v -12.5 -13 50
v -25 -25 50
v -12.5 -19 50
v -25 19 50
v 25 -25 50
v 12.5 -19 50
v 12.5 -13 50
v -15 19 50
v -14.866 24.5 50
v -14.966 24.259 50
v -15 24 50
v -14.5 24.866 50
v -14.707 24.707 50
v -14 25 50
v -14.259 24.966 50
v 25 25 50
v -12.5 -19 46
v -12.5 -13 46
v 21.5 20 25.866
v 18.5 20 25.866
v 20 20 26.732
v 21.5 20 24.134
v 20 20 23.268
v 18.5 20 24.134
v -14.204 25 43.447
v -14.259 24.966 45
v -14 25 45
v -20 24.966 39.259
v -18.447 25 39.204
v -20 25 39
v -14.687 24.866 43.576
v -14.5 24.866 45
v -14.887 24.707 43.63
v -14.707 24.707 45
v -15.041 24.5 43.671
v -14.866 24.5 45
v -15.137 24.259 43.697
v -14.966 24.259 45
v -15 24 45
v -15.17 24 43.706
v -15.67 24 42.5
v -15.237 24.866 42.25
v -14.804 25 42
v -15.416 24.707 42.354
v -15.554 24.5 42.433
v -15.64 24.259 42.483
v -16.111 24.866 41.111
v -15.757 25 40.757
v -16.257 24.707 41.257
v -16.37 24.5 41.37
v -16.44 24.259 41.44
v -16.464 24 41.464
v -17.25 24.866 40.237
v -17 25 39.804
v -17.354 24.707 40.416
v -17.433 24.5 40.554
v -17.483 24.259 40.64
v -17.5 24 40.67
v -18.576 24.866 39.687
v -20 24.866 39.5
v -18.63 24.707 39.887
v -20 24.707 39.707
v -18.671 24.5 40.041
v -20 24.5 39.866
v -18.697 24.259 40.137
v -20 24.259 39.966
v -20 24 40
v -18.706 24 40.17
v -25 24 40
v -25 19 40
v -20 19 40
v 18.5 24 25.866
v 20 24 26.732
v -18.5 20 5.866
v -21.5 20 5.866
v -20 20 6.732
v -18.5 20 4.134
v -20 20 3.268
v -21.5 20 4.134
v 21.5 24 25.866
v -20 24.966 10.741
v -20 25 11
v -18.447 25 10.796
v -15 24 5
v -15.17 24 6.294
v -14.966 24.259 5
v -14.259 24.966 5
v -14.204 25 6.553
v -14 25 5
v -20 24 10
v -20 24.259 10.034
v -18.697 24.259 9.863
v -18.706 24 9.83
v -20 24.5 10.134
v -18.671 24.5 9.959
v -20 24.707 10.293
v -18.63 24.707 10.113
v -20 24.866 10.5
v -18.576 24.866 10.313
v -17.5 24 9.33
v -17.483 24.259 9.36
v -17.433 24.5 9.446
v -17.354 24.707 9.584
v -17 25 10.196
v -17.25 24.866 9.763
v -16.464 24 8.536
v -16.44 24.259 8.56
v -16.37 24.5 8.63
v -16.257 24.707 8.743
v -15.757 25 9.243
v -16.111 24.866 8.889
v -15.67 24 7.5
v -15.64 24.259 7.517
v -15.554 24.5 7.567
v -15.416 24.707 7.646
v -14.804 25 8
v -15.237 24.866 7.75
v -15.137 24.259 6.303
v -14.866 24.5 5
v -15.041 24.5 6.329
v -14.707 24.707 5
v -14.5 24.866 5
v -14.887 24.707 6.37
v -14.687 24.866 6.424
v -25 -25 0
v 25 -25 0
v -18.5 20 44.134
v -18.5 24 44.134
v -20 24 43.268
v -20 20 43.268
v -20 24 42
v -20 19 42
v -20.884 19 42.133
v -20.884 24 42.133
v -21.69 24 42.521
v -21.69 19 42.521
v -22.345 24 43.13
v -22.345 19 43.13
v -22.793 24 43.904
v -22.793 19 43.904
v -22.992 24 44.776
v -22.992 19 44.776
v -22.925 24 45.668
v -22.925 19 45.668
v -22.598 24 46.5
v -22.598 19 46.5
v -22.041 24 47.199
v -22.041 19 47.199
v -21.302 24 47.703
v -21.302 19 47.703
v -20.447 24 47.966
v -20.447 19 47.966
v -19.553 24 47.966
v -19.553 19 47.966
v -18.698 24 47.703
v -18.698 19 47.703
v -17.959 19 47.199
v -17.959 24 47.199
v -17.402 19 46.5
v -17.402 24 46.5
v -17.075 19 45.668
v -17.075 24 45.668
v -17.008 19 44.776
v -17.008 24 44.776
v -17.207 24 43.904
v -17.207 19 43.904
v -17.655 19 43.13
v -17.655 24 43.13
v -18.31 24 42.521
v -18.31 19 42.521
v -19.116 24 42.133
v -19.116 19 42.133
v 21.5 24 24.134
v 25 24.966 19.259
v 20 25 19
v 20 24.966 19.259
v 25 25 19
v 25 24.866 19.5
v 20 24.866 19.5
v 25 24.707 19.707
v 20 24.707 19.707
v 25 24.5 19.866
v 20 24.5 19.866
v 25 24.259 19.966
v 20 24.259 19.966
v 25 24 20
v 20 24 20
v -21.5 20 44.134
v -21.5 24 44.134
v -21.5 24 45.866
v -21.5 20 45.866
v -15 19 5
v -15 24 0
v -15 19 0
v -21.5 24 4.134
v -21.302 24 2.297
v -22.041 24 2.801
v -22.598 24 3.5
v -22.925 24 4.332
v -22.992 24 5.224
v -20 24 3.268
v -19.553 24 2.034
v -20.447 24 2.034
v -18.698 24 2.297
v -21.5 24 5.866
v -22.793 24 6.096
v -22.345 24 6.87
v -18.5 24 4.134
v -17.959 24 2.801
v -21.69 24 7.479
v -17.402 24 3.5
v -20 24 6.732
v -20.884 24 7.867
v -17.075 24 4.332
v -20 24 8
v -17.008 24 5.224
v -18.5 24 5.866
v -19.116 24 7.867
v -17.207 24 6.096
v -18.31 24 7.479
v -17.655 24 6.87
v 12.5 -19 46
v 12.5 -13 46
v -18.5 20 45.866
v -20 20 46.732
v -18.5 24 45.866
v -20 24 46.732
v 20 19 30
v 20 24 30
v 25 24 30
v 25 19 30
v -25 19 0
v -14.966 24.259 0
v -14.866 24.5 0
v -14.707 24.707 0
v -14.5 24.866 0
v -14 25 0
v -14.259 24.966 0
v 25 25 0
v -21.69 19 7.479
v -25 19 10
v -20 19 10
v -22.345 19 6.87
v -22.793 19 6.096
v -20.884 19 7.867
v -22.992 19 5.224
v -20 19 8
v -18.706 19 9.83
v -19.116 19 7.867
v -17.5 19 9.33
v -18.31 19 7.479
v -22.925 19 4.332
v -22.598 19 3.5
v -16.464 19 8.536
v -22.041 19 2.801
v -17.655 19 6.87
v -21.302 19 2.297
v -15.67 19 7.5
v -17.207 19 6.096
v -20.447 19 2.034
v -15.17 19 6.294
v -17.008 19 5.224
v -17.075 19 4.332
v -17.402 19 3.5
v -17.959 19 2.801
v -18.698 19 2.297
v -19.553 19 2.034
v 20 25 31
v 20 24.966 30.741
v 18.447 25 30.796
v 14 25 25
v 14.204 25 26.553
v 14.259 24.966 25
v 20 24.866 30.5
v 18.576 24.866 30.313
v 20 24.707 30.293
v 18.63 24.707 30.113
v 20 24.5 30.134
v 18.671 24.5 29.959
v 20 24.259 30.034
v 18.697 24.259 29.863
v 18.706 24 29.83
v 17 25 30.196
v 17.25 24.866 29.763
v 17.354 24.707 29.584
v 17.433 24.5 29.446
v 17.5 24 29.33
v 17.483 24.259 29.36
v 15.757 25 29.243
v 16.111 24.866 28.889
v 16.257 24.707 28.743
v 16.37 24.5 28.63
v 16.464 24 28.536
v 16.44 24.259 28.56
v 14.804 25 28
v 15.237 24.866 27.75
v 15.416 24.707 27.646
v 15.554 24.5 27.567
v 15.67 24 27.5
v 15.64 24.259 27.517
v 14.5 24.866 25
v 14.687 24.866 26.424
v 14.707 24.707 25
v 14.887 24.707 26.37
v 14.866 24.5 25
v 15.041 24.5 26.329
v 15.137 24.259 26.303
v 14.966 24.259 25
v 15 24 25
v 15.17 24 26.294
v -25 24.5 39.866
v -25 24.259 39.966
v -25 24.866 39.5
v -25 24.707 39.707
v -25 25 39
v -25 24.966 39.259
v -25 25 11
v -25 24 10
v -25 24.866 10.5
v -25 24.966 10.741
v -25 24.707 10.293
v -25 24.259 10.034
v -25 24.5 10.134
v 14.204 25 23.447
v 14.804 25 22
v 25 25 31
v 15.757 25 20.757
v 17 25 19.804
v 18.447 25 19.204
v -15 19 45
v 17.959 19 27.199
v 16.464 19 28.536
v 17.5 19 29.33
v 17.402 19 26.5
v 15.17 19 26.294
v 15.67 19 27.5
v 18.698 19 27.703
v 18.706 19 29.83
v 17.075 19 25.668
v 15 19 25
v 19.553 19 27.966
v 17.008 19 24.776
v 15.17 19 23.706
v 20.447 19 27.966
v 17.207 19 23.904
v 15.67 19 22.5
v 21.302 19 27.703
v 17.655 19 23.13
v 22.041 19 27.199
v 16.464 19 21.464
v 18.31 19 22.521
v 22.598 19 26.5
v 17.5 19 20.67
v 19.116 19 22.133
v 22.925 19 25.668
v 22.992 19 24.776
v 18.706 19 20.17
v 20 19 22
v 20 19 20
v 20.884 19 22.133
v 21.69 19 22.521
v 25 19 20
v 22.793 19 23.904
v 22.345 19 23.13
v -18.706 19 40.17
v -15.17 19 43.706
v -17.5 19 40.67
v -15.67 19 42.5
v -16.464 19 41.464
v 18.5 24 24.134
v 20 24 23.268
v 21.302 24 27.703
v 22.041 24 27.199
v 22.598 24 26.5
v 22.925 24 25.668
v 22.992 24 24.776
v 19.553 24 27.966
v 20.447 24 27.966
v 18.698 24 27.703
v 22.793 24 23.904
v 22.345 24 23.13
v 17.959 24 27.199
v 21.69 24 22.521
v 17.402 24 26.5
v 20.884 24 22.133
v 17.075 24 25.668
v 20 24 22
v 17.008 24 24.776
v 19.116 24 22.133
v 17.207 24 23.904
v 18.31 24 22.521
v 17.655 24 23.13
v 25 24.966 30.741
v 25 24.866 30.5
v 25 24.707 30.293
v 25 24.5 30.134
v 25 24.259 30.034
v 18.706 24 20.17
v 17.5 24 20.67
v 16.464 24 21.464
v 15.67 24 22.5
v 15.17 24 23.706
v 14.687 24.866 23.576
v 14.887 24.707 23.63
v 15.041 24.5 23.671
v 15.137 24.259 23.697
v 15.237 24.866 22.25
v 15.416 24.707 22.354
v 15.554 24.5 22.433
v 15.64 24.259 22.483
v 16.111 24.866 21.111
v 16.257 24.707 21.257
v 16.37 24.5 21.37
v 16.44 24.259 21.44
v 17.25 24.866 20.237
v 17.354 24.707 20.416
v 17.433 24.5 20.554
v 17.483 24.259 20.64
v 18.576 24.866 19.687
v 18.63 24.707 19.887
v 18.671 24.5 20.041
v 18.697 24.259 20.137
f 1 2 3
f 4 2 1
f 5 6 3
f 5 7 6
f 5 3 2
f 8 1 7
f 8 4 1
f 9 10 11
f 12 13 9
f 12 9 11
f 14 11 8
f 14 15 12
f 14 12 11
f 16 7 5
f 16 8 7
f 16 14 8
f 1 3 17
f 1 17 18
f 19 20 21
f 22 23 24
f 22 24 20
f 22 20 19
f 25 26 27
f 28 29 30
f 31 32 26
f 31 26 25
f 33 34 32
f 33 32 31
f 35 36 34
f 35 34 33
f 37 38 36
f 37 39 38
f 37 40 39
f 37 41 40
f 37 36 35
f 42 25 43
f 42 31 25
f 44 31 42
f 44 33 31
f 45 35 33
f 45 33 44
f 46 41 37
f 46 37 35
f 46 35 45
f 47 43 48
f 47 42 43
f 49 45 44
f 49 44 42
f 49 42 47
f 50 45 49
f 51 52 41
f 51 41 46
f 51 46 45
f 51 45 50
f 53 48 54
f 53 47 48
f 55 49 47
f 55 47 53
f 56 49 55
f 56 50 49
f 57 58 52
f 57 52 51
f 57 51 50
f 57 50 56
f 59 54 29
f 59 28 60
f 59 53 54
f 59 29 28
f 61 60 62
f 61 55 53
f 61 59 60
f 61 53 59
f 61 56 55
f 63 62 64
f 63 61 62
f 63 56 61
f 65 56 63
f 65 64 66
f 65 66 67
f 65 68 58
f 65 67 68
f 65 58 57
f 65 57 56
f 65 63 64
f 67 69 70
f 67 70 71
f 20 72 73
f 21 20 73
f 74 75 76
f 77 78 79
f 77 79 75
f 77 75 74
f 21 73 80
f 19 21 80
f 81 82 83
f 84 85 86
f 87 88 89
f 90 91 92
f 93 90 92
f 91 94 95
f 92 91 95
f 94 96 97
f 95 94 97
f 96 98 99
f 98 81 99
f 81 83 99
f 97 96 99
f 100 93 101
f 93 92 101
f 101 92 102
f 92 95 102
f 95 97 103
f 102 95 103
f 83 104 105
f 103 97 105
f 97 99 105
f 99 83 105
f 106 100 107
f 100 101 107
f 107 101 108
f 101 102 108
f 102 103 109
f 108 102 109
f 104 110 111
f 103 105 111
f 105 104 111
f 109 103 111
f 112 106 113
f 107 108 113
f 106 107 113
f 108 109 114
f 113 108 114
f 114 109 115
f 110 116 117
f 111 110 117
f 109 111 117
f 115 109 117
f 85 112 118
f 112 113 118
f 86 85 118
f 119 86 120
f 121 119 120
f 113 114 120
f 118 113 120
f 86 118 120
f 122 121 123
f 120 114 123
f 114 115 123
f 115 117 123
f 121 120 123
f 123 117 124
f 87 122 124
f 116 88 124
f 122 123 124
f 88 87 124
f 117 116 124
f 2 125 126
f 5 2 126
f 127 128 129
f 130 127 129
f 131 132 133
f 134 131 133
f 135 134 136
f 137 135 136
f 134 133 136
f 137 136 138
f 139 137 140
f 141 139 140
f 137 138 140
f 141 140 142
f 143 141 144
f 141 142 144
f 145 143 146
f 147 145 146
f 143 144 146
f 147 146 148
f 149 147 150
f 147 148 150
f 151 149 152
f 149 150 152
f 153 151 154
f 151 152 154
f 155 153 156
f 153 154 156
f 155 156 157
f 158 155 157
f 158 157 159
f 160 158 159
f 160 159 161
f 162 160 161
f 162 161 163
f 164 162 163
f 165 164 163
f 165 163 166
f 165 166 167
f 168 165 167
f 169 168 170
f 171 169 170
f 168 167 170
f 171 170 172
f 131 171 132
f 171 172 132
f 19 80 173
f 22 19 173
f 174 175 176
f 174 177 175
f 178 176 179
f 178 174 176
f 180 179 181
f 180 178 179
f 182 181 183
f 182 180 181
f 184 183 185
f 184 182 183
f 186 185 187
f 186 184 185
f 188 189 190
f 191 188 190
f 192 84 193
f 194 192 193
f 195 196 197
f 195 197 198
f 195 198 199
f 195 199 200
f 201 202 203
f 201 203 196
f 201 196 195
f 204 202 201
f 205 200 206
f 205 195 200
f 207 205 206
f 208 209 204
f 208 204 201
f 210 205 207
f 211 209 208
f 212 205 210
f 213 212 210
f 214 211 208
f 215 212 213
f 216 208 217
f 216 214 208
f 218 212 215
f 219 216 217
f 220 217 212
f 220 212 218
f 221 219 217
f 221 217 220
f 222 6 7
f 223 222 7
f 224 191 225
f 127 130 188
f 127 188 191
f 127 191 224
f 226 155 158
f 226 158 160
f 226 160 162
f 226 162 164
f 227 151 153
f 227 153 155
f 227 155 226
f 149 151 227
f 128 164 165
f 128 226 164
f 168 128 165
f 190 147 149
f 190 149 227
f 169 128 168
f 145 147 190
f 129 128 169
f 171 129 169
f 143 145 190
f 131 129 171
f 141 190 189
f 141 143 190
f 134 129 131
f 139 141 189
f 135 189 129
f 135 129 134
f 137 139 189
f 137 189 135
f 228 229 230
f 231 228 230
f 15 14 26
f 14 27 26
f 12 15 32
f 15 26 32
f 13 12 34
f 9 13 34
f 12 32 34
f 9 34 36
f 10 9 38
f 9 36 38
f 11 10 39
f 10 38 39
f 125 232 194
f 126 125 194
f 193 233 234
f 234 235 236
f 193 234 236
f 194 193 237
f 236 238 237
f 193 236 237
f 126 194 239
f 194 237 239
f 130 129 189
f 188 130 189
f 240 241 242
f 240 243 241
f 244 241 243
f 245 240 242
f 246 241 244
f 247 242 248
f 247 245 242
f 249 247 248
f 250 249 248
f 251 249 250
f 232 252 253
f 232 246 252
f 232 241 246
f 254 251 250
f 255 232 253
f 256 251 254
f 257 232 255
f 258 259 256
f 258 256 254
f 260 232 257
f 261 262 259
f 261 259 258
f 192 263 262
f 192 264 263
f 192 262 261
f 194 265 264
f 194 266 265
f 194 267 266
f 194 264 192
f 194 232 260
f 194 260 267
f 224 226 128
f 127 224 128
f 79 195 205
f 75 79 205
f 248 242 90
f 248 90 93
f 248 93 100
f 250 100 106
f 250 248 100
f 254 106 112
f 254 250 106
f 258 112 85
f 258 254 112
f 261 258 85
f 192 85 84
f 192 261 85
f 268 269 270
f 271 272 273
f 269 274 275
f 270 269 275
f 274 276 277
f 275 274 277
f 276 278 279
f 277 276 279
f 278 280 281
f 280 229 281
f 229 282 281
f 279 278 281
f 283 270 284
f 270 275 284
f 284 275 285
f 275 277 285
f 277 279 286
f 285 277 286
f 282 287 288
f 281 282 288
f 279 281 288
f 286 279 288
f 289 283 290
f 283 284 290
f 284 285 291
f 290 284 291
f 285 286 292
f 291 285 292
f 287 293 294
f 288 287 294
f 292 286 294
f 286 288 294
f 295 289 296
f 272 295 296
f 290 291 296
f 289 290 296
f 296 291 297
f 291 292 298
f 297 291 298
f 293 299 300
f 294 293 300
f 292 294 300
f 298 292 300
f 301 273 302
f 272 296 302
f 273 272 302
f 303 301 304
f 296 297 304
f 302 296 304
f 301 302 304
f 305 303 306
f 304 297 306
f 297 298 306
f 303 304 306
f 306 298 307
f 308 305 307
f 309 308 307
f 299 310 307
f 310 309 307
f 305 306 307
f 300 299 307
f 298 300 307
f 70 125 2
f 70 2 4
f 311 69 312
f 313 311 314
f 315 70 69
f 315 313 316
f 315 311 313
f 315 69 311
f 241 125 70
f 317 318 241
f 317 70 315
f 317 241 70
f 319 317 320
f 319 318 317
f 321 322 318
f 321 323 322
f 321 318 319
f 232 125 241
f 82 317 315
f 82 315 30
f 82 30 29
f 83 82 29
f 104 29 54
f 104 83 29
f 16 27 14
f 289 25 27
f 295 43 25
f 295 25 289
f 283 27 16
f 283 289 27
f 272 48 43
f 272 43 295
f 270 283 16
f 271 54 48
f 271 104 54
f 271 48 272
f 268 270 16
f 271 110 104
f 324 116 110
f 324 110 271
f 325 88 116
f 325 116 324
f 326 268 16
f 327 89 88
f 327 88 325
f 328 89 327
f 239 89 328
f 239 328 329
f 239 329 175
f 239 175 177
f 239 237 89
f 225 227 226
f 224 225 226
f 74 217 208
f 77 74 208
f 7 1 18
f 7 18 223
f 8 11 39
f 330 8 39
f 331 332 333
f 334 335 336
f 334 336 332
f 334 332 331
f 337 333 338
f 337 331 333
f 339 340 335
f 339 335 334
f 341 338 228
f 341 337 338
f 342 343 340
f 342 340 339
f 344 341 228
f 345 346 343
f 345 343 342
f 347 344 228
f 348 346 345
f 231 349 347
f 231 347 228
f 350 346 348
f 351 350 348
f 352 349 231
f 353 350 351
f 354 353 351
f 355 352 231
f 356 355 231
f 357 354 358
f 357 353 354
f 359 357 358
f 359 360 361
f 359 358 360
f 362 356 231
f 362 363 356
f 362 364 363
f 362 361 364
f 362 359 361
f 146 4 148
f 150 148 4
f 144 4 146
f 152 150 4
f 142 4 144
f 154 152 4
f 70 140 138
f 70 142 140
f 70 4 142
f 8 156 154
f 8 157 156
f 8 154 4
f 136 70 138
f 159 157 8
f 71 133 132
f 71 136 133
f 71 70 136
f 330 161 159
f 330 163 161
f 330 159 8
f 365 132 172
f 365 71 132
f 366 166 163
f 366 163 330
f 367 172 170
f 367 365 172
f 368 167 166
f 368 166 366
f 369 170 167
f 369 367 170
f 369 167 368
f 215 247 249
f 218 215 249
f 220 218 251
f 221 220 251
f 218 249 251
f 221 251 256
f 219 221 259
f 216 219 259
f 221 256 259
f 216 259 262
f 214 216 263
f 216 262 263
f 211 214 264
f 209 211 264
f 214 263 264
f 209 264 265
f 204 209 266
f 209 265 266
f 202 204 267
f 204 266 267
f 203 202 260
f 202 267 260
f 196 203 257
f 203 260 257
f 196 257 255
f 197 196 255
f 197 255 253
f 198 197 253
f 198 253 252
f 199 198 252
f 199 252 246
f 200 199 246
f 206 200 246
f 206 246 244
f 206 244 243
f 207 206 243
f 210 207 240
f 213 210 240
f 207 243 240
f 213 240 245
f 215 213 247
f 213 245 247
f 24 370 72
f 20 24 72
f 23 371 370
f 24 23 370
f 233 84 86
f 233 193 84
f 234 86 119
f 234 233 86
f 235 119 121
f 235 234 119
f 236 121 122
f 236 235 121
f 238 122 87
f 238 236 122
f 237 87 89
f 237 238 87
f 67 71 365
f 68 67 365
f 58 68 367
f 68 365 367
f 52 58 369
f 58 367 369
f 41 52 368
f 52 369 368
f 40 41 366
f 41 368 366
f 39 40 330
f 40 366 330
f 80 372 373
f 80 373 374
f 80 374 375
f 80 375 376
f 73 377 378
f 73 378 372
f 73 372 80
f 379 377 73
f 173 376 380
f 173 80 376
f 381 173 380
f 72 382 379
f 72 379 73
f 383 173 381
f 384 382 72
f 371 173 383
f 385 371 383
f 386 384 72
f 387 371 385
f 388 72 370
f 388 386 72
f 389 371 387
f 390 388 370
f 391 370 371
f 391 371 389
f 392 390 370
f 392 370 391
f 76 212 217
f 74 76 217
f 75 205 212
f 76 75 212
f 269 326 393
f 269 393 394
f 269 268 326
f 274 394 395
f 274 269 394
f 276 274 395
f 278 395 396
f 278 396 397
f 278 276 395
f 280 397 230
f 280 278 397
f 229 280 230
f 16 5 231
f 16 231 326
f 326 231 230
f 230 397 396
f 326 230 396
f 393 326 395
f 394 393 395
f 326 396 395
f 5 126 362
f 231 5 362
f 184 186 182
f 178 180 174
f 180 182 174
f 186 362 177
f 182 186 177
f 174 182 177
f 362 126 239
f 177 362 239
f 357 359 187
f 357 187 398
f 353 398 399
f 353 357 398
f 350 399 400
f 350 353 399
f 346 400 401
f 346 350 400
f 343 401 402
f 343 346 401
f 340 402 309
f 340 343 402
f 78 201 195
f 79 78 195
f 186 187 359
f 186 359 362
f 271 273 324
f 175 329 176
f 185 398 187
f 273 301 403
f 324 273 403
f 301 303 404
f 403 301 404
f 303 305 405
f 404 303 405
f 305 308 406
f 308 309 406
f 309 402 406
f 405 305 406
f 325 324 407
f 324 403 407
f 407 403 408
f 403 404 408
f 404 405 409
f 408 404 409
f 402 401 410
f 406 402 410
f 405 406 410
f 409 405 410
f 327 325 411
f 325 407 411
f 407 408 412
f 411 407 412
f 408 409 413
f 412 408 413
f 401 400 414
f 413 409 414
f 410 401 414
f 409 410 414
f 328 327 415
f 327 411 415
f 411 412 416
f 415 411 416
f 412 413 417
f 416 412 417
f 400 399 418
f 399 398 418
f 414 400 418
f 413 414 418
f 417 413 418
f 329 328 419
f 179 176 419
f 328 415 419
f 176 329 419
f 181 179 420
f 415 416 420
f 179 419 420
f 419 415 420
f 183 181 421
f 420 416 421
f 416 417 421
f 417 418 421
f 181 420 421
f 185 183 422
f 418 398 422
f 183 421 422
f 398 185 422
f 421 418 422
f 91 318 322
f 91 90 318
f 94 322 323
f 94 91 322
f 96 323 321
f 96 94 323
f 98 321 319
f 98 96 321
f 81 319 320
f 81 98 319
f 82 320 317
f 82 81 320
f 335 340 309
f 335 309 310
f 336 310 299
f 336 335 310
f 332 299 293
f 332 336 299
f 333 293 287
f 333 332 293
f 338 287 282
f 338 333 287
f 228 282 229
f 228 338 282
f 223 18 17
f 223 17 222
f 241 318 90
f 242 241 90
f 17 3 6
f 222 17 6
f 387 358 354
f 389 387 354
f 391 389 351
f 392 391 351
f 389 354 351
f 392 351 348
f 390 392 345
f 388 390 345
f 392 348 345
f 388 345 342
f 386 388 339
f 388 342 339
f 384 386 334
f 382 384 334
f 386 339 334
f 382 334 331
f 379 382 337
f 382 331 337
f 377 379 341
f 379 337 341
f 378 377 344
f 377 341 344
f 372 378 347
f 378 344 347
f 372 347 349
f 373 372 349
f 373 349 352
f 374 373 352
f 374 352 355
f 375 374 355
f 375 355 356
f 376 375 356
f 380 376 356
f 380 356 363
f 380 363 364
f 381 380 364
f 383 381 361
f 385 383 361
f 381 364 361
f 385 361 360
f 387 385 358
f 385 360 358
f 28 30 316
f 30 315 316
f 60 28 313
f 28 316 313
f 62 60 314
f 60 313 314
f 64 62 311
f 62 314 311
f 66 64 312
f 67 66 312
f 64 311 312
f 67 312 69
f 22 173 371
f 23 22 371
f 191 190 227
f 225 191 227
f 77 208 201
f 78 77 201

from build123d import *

# Parameters (mm, degrees)
SKETCH1_W           = 50
SKETCH1_H           = 50
BOSS_EXTRUDE1_DEPTH = 50
SKETCH2_W           = 10
SKETCH2_H           = 10
CUT_EXTRUDE1_DEPTH  = 6
FILLET1_R           = 5
FILLET2_R           = 1
SKETCH4_R           = 3
BOSS_EXTRUDE2_DEPTH = 5
CUT_EXTRUDE2_DEPTH  = 4
SKETCH6_W           = 25
SKETCH6_H           = 6
CUT_EXTRUDE3_DEPTH  = 4


with BuildPart() as part:
    # Sketch1 → Boss-Extrude1 (new body)
    with BuildSketch(Plane.XY):
        Rectangle(SKETCH1_W, SKETCH1_H)
    extrude(amount=BOSS_EXTRUDE1_DEPTH)

    # Sketch2 → Cut-Extrude1 (cut)
    with BuildSketch(Plane(origin=(0, 25, 0), x_dir=(1, 0, 0), z_dir=(0, 1, 0))):
        with Locations((-20, -5)):
            Rectangle(SKETCH2_W, SKETCH2_H)
        with Locations((-20, -45)):
            Rectangle(SKETCH2_W, SKETCH2_H)
        with Locations((20, -25)):
            Rectangle(SKETCH2_W, SKETCH2_H)
    extrude(amount=-CUT_EXTRUDE1_DEPTH, mode=Mode.SUBTRACT)

    # Fillet1
    fillet1_edges = [part.edges().sort_by_distance(p)[0] for p in [
        (15, 22, 30),
        (15, 22, 20),
        (-15, 22, 40),
        (-15, 22, 10),
    ]]
    fillet(fillet1_edges, radius=FILLET1_R - 0.0001)  # a hair under: the kernel refuses the full size

    # Fillet2
    fillet2_edges = [part.edges().sort_by_distance(p)[0] for p in [
        (-22.49995, 25, 10),
        (-15, 25, 47.49995),
        (22.49995, 25, 20),
        (22.49995, 25, 30),
        (-22.49995, 25, 40),
        (-15, 25, 2.50005),
        (16.464436805, 25, 28.535563195),
        (16.464436805, 25, 21.464436805),
        (-16.464436805, 25, 41.464436805),
        (-16.464436805, 25, 8.535563195),
    ]]
    fillet(fillet2_edges, radius=FILLET2_R)

    # Sketch4 → Boss-Extrude2 (add)
    with BuildSketch(Plane(origin=(0, 19, 0), x_dir=(1, 0, 0), z_dir=(0, 1, 0))):
        with Locations(Location((-20, -5, 0), (0, 0, 270))):
            Circle(SKETCH4_R)
        with Locations(Location((-20, -45, 0), (0, 0, 90))):
            Circle(SKETCH4_R)
        with Locations(Location((20, -25, 0), (0, 0, 90))):
            Circle(SKETCH4_R)
    extrude(amount=BOSS_EXTRUDE2_DEPTH)

    # Sketch5 → Cut-Extrude2 (cut)
    with BuildSketch(Plane(origin=(0, 24, 0), x_dir=(1, 0, 0), z_dir=(0, 1, 0))):
        Polygon((-20, -3.267949192), (-21.5, -4.133974596), (-21.5, -5.866025404), (-20, -6.732050808), (-18.5, -5.866025404), (-18.5, -4.133974596), align=None)
        Polygon((-20, -43.267949192), (-21.5, -44.133974596), (-21.5, -45.866025404), (-20, -46.732050808), (-18.5, -45.866025404), (-18.5, -44.133974596), align=None)
        Polygon((20, -23.267949192), (18.5, -24.133974596), (18.5, -25.866025404), (20, -26.732050808), (21.5, -25.866025404), (21.5, -24.133974596), align=None)
    extrude(amount=-CUT_EXTRUDE2_DEPTH, mode=Mode.SUBTRACT)

    # Sketch6 → Cut-Extrude3 (cut)
    with BuildSketch(Plane.XY.offset(50)):
        with Locations((0, -16)):
            Rectangle(SKETCH6_W, SKETCH6_H)
    extrude(amount=-CUT_EXTRUDE3_DEPTH, mode=Mode.SUBTRACT)


solid = part.part
